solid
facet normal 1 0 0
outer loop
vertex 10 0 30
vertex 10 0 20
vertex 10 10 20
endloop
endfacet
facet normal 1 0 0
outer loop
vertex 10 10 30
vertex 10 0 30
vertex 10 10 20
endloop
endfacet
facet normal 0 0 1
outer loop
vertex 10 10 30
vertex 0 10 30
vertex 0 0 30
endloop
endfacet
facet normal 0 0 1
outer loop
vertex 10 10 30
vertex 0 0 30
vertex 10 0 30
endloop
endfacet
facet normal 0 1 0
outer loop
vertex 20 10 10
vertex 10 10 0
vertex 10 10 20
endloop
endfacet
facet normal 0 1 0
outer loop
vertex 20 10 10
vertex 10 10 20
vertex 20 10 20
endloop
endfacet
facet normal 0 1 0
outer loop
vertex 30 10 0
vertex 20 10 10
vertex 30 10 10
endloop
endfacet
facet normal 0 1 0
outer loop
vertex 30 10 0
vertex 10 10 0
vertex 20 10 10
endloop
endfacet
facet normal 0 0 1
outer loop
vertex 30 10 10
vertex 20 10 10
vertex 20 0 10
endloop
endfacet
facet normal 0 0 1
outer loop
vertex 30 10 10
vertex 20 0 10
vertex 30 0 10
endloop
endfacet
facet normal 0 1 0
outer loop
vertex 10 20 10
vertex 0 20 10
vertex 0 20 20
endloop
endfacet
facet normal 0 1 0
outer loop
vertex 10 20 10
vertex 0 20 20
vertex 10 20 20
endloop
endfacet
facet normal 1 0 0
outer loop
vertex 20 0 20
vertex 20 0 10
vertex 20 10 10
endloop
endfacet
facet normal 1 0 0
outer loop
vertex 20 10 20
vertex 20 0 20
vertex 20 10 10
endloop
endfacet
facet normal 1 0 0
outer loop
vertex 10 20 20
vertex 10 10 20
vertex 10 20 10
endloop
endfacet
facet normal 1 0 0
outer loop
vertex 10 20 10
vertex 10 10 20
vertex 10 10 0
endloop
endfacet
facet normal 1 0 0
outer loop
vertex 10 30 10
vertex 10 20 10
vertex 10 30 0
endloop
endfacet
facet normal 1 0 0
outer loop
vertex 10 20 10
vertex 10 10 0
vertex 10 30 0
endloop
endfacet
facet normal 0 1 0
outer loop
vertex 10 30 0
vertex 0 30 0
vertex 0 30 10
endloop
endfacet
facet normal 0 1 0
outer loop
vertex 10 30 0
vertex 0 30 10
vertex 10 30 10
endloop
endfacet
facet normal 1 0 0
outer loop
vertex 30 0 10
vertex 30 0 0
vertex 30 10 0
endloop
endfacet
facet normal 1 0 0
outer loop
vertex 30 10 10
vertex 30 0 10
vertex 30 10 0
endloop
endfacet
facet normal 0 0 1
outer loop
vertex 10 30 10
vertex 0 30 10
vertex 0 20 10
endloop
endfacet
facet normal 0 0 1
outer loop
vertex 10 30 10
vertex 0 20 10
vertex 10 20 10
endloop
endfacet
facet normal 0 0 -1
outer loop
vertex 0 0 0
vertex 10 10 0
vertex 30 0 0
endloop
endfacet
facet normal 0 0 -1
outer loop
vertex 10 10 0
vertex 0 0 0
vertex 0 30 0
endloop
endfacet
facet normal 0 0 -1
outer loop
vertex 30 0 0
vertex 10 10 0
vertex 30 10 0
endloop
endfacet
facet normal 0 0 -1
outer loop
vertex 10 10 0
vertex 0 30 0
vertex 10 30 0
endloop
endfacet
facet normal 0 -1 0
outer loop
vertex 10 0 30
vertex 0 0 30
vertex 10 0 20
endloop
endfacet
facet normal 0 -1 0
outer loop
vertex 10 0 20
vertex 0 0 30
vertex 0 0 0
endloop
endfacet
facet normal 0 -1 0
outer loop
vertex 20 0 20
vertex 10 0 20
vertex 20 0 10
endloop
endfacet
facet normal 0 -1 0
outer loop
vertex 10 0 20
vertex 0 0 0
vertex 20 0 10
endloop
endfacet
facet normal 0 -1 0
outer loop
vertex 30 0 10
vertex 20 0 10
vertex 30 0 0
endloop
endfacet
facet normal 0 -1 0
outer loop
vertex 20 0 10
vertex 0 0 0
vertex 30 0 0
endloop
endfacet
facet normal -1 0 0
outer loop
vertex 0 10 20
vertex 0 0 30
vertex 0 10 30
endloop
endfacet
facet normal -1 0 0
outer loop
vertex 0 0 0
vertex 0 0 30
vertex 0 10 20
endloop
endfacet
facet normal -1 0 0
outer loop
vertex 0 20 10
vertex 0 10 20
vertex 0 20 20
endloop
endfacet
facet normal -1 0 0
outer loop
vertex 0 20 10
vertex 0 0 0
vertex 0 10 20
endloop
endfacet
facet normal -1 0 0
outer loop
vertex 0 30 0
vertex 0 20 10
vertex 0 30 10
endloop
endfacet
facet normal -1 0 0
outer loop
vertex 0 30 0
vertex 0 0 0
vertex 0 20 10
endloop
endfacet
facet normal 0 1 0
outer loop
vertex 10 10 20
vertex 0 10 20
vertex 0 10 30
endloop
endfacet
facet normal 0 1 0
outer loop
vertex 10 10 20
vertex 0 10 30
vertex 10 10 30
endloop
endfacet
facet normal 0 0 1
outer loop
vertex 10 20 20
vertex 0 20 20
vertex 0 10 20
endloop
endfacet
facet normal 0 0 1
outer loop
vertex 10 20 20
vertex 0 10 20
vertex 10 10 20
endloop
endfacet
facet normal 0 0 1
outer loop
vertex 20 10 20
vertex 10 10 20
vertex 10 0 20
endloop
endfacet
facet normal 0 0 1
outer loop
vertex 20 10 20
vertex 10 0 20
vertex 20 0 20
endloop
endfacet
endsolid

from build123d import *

# Parameters (mm, degrees)
BOX_W        = 10
BOX_H        = 10
BOX_DEPTH    = 30
BOX001_W     = 10
BOX001_H     = 10
BOX001_DEPTH = 20
BOX002_W     = 10
BOX002_H     = 10
BOX002_DEPTH = 20
BOX003_W     = 10
BOX003_H     = 10
BOX003_DEPTH = 10
BOX004_W     = 10
BOX004_H     = 10
BOX004_DEPTH = 10


with BuildPart() as nivell1_cub1:
    # Box → Box (new body)
    with BuildSketch(Plane.XY):
        with Locations((5, 5)):
            Rectangle(BOX_W, BOX_H)
    extrude(amount=BOX_DEPTH)


with BuildPart() as nivell1_cub2:
    # Box001 → Box001 (new body)
    with BuildSketch(Plane(origin=(10, 0, 0), x_dir=(1, 0, 0), z_dir=(0, 0, 1))):
        with Locations((5, 5)):
            Rectangle(BOX001_W, BOX001_H)
    extrude(amount=BOX001_DEPTH)


with BuildPart() as nivell1_cub3:
    # Box002 → Box002 (new body)
    with BuildSketch(Plane(origin=(0, 10, 0), x_dir=(1, 0, 0), z_dir=(0, 0, 1))):
        with Locations((5, 5)):
            Rectangle(BOX002_W, BOX002_H)
    extrude(amount=BOX002_DEPTH)


with BuildPart() as nivell1_cub4:
    # Box003 → Box003 (new body)
    with BuildSketch(Plane(origin=(20, 0, 0), x_dir=(1, 0, 0), z_dir=(0, 0, 1))):
        with Locations((5, 5)):
            Rectangle(BOX003_W, BOX003_H)
    extrude(amount=BOX003_DEPTH)


with BuildPart() as fusion:
    # Box004 → Box004 (new body)
    with BuildSketch(Plane(origin=(0, 20, 0), x_dir=(1, 0, 0), z_dir=(0, 0, 1))):
        with Locations((5, 5)):
            Rectangle(BOX004_W, BOX004_H)
    extrude(amount=BOX004_DEPTH)

    # Fusion: union nivell1_cub1, nivell1_cub2, nivell1_cub3, nivell1_cub4
    add(nivell1_cub1.part)
    add(nivell1_cub2.part)
    add(nivell1_cub3.part)
    add(nivell1_cub4.part)


solid = fusion.part
